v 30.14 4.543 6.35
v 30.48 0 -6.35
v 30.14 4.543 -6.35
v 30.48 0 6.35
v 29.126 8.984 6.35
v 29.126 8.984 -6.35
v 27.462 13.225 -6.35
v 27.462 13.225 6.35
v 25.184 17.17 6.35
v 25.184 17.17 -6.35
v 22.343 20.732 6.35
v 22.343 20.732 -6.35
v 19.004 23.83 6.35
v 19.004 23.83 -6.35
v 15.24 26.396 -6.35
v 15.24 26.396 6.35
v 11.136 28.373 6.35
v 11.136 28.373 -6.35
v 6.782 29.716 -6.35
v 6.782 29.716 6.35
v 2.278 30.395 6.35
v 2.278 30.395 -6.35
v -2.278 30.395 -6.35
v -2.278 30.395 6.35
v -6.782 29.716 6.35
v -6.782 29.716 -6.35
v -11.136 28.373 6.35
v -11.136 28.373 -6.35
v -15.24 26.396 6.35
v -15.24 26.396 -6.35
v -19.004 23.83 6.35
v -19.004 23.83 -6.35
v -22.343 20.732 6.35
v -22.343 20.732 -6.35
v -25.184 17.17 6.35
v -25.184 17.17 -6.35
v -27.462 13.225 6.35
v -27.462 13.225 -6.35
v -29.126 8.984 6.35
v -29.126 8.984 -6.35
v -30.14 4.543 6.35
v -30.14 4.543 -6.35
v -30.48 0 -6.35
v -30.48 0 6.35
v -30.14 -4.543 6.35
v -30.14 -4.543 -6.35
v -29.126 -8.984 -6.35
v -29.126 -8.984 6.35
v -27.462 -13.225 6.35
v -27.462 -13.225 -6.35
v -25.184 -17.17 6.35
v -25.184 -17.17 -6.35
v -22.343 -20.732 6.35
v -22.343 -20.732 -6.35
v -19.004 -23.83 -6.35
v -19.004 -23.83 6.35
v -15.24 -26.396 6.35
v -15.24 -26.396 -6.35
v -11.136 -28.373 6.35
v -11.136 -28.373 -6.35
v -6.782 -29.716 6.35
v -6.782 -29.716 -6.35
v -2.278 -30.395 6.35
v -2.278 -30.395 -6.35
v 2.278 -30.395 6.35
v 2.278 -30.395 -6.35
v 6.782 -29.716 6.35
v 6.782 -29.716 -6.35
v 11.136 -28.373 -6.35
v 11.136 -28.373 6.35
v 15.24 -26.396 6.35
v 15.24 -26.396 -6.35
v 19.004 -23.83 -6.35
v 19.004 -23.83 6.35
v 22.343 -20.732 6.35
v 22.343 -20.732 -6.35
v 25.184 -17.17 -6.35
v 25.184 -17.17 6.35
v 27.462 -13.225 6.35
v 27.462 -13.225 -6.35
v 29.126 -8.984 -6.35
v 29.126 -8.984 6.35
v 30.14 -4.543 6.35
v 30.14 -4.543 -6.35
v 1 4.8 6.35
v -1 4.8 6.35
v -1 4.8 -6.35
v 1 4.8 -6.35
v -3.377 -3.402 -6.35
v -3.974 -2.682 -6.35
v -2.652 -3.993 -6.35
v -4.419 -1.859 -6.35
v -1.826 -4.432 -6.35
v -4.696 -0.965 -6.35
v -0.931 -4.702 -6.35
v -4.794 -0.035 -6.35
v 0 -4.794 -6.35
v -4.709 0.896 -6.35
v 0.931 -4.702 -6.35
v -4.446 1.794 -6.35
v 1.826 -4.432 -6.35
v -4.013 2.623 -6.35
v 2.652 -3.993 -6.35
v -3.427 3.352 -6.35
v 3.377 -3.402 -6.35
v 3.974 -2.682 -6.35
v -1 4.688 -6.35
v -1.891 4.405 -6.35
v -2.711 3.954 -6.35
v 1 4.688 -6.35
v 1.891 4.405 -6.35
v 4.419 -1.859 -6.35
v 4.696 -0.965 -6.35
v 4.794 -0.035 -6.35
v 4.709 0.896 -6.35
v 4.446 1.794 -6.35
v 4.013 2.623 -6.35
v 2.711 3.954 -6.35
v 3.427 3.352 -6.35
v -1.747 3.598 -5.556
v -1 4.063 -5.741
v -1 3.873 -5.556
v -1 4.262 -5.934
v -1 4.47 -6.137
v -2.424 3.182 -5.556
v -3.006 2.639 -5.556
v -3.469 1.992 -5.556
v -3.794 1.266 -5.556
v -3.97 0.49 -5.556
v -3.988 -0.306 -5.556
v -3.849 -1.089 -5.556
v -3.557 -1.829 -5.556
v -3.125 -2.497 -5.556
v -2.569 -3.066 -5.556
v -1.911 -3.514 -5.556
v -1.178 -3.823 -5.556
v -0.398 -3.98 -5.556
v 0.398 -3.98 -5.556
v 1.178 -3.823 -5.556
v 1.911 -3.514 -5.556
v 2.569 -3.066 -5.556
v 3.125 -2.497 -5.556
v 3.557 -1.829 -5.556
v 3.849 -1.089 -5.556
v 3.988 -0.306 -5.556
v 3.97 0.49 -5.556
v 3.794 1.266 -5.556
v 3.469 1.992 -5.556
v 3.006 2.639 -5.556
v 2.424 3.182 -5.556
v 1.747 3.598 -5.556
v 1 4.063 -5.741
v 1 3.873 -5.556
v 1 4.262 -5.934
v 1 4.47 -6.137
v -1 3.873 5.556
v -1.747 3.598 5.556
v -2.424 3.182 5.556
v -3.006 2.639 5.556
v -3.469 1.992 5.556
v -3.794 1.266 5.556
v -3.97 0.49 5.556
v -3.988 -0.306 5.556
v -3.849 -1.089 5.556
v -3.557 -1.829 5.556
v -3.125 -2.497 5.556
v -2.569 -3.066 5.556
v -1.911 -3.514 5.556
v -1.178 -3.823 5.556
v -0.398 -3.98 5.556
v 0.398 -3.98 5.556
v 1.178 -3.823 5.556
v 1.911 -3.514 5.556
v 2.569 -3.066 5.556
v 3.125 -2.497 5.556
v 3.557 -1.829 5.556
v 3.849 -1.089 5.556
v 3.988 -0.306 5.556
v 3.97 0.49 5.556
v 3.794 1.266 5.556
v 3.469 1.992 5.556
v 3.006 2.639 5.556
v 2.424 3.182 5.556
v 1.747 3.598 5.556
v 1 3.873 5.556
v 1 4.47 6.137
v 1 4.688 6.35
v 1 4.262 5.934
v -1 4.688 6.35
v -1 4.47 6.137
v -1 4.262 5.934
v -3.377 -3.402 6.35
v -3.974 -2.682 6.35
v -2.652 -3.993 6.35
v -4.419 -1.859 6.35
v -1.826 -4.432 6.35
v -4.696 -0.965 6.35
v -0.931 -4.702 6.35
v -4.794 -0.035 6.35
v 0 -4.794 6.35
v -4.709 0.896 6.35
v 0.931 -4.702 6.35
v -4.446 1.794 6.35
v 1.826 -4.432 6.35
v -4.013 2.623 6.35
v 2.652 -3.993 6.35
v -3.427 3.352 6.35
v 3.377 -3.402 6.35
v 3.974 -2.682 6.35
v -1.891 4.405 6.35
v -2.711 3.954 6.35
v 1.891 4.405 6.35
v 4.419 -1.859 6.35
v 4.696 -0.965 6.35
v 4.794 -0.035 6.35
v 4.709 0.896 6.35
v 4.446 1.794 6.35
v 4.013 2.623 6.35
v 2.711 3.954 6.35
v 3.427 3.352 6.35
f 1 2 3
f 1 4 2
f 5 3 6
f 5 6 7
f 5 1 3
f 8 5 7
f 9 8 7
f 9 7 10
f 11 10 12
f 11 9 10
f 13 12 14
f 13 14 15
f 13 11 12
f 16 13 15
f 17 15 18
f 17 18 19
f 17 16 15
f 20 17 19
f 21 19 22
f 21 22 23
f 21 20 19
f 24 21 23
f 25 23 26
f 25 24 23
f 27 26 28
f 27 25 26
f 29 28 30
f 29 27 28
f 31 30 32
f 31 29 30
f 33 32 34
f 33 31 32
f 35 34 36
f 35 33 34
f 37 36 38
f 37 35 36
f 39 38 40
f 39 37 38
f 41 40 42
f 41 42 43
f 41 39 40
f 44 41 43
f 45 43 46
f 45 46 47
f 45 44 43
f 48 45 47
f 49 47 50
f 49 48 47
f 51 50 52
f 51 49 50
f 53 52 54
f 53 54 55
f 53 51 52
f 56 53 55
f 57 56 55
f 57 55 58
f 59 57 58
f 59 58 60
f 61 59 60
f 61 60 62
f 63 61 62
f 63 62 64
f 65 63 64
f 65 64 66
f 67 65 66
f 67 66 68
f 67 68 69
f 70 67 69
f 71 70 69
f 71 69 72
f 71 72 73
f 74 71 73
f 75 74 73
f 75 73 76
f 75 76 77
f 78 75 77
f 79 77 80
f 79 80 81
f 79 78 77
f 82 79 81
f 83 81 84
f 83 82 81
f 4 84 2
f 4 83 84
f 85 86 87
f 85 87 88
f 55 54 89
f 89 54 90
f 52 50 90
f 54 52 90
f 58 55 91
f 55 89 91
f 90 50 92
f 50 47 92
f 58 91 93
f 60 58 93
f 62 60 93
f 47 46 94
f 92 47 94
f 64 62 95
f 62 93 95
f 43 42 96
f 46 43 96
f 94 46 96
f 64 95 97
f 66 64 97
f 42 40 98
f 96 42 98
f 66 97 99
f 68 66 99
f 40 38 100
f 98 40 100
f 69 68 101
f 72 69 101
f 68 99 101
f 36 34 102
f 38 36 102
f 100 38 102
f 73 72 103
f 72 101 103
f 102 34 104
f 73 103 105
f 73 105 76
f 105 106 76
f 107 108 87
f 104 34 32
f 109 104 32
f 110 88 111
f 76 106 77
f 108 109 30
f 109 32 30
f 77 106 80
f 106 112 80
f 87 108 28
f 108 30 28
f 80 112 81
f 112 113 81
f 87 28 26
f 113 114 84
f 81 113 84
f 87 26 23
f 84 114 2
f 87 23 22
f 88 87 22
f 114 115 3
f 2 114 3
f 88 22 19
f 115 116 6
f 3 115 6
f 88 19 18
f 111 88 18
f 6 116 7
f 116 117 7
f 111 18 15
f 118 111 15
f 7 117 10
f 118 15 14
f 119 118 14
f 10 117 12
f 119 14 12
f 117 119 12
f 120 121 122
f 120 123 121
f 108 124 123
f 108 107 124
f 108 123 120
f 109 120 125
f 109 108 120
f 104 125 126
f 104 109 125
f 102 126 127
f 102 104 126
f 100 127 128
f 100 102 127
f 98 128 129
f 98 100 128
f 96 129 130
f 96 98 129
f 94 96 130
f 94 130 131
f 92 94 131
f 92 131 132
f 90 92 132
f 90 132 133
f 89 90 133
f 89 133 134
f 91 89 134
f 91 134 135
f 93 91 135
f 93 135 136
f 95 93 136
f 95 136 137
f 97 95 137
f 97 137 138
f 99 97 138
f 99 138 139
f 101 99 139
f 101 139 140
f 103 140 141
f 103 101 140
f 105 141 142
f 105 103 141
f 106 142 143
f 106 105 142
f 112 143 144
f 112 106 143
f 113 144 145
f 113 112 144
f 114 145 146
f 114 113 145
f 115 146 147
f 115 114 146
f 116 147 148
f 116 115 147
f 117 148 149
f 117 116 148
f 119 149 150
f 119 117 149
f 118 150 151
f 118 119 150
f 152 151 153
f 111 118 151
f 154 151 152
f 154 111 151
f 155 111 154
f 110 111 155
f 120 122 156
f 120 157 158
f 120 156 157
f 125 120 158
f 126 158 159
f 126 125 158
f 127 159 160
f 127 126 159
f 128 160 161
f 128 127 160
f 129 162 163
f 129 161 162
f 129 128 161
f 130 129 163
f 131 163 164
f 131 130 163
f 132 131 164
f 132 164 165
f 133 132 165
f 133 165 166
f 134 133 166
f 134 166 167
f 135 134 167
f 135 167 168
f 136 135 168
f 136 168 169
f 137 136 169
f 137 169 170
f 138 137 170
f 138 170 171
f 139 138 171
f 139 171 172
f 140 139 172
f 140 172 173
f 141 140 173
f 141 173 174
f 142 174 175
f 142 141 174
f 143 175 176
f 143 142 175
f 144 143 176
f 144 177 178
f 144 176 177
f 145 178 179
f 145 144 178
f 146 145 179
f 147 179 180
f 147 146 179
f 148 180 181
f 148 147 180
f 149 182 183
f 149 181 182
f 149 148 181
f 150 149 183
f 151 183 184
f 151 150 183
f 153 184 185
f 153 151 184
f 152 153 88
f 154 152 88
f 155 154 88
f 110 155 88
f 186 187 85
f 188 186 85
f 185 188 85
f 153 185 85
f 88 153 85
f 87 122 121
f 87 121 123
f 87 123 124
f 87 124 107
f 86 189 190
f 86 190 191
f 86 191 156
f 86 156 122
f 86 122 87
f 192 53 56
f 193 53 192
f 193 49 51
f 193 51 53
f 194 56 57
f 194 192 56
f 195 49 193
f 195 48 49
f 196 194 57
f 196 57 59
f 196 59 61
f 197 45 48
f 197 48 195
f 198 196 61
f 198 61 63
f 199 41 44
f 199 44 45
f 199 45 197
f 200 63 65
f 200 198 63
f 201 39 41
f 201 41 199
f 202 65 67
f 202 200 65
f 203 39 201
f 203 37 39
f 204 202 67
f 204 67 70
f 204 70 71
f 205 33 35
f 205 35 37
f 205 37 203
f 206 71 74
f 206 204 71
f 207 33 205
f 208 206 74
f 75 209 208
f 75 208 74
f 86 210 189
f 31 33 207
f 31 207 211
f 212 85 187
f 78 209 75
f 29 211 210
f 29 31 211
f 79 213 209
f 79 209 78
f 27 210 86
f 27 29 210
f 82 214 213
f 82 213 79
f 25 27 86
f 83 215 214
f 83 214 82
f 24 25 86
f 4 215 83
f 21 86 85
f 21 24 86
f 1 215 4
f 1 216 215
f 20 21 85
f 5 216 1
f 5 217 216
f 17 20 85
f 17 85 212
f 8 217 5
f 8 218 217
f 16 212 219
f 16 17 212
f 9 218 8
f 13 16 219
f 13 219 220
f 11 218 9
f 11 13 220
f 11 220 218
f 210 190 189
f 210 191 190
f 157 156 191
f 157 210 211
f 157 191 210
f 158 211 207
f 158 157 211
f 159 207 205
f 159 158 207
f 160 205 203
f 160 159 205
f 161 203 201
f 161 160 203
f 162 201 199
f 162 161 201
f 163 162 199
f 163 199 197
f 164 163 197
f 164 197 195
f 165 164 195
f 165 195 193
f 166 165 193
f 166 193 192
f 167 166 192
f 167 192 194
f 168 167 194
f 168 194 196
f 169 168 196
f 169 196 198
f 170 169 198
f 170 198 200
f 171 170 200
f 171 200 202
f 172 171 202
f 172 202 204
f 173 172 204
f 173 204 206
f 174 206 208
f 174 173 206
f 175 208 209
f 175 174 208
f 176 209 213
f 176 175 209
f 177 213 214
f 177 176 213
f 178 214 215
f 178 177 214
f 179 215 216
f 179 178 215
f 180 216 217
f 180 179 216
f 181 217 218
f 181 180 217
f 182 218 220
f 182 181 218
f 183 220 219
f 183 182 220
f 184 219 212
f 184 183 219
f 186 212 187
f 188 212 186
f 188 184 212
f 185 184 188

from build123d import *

# Parameters (mm, degrees)
SKETCH1_R          = 30.48
SKETCH1_R_2        = 4
EXTRUDE1_DEPTH     = 6.35
CHAMFER1_SIZE      = 0.79375
SKETCH3_W          = 2
SKETCH3_H          = 2
CUT_EXTRUDE1_DEPTH = 45.937187273


with BuildPart() as part:
    # Sketch1 → Extrude1 (new, symmetric)
    with BuildSketch(Plane.XY):
        Circle(SKETCH1_R)
        Circle(SKETCH1_R_2, mode=Mode.SUBTRACT)
    extrude(amount=EXTRUDE1_DEPTH, both=True)

    # Chamfer1
    chamfer1_edges = [part.edges().sort_by_distance(p)[0] for p in [
        (-4, 0, -6.35),
        (-4, 0, 6.35),
    ]]
    chamfer(chamfer1_edges, length=CHAMFER1_SIZE)

    # Sketch3 → Cut-Extrude1 (cut, through all)
    with BuildSketch(Plane.XY.offset(6.35)):
        with Locations((0, 3.8)):
            Rectangle(SKETCH3_W, SKETCH3_H)
    extrude(amount=-CUT_EXTRUDE1_DEPTH, mode=Mode.SUBTRACT)


solid = part.part
